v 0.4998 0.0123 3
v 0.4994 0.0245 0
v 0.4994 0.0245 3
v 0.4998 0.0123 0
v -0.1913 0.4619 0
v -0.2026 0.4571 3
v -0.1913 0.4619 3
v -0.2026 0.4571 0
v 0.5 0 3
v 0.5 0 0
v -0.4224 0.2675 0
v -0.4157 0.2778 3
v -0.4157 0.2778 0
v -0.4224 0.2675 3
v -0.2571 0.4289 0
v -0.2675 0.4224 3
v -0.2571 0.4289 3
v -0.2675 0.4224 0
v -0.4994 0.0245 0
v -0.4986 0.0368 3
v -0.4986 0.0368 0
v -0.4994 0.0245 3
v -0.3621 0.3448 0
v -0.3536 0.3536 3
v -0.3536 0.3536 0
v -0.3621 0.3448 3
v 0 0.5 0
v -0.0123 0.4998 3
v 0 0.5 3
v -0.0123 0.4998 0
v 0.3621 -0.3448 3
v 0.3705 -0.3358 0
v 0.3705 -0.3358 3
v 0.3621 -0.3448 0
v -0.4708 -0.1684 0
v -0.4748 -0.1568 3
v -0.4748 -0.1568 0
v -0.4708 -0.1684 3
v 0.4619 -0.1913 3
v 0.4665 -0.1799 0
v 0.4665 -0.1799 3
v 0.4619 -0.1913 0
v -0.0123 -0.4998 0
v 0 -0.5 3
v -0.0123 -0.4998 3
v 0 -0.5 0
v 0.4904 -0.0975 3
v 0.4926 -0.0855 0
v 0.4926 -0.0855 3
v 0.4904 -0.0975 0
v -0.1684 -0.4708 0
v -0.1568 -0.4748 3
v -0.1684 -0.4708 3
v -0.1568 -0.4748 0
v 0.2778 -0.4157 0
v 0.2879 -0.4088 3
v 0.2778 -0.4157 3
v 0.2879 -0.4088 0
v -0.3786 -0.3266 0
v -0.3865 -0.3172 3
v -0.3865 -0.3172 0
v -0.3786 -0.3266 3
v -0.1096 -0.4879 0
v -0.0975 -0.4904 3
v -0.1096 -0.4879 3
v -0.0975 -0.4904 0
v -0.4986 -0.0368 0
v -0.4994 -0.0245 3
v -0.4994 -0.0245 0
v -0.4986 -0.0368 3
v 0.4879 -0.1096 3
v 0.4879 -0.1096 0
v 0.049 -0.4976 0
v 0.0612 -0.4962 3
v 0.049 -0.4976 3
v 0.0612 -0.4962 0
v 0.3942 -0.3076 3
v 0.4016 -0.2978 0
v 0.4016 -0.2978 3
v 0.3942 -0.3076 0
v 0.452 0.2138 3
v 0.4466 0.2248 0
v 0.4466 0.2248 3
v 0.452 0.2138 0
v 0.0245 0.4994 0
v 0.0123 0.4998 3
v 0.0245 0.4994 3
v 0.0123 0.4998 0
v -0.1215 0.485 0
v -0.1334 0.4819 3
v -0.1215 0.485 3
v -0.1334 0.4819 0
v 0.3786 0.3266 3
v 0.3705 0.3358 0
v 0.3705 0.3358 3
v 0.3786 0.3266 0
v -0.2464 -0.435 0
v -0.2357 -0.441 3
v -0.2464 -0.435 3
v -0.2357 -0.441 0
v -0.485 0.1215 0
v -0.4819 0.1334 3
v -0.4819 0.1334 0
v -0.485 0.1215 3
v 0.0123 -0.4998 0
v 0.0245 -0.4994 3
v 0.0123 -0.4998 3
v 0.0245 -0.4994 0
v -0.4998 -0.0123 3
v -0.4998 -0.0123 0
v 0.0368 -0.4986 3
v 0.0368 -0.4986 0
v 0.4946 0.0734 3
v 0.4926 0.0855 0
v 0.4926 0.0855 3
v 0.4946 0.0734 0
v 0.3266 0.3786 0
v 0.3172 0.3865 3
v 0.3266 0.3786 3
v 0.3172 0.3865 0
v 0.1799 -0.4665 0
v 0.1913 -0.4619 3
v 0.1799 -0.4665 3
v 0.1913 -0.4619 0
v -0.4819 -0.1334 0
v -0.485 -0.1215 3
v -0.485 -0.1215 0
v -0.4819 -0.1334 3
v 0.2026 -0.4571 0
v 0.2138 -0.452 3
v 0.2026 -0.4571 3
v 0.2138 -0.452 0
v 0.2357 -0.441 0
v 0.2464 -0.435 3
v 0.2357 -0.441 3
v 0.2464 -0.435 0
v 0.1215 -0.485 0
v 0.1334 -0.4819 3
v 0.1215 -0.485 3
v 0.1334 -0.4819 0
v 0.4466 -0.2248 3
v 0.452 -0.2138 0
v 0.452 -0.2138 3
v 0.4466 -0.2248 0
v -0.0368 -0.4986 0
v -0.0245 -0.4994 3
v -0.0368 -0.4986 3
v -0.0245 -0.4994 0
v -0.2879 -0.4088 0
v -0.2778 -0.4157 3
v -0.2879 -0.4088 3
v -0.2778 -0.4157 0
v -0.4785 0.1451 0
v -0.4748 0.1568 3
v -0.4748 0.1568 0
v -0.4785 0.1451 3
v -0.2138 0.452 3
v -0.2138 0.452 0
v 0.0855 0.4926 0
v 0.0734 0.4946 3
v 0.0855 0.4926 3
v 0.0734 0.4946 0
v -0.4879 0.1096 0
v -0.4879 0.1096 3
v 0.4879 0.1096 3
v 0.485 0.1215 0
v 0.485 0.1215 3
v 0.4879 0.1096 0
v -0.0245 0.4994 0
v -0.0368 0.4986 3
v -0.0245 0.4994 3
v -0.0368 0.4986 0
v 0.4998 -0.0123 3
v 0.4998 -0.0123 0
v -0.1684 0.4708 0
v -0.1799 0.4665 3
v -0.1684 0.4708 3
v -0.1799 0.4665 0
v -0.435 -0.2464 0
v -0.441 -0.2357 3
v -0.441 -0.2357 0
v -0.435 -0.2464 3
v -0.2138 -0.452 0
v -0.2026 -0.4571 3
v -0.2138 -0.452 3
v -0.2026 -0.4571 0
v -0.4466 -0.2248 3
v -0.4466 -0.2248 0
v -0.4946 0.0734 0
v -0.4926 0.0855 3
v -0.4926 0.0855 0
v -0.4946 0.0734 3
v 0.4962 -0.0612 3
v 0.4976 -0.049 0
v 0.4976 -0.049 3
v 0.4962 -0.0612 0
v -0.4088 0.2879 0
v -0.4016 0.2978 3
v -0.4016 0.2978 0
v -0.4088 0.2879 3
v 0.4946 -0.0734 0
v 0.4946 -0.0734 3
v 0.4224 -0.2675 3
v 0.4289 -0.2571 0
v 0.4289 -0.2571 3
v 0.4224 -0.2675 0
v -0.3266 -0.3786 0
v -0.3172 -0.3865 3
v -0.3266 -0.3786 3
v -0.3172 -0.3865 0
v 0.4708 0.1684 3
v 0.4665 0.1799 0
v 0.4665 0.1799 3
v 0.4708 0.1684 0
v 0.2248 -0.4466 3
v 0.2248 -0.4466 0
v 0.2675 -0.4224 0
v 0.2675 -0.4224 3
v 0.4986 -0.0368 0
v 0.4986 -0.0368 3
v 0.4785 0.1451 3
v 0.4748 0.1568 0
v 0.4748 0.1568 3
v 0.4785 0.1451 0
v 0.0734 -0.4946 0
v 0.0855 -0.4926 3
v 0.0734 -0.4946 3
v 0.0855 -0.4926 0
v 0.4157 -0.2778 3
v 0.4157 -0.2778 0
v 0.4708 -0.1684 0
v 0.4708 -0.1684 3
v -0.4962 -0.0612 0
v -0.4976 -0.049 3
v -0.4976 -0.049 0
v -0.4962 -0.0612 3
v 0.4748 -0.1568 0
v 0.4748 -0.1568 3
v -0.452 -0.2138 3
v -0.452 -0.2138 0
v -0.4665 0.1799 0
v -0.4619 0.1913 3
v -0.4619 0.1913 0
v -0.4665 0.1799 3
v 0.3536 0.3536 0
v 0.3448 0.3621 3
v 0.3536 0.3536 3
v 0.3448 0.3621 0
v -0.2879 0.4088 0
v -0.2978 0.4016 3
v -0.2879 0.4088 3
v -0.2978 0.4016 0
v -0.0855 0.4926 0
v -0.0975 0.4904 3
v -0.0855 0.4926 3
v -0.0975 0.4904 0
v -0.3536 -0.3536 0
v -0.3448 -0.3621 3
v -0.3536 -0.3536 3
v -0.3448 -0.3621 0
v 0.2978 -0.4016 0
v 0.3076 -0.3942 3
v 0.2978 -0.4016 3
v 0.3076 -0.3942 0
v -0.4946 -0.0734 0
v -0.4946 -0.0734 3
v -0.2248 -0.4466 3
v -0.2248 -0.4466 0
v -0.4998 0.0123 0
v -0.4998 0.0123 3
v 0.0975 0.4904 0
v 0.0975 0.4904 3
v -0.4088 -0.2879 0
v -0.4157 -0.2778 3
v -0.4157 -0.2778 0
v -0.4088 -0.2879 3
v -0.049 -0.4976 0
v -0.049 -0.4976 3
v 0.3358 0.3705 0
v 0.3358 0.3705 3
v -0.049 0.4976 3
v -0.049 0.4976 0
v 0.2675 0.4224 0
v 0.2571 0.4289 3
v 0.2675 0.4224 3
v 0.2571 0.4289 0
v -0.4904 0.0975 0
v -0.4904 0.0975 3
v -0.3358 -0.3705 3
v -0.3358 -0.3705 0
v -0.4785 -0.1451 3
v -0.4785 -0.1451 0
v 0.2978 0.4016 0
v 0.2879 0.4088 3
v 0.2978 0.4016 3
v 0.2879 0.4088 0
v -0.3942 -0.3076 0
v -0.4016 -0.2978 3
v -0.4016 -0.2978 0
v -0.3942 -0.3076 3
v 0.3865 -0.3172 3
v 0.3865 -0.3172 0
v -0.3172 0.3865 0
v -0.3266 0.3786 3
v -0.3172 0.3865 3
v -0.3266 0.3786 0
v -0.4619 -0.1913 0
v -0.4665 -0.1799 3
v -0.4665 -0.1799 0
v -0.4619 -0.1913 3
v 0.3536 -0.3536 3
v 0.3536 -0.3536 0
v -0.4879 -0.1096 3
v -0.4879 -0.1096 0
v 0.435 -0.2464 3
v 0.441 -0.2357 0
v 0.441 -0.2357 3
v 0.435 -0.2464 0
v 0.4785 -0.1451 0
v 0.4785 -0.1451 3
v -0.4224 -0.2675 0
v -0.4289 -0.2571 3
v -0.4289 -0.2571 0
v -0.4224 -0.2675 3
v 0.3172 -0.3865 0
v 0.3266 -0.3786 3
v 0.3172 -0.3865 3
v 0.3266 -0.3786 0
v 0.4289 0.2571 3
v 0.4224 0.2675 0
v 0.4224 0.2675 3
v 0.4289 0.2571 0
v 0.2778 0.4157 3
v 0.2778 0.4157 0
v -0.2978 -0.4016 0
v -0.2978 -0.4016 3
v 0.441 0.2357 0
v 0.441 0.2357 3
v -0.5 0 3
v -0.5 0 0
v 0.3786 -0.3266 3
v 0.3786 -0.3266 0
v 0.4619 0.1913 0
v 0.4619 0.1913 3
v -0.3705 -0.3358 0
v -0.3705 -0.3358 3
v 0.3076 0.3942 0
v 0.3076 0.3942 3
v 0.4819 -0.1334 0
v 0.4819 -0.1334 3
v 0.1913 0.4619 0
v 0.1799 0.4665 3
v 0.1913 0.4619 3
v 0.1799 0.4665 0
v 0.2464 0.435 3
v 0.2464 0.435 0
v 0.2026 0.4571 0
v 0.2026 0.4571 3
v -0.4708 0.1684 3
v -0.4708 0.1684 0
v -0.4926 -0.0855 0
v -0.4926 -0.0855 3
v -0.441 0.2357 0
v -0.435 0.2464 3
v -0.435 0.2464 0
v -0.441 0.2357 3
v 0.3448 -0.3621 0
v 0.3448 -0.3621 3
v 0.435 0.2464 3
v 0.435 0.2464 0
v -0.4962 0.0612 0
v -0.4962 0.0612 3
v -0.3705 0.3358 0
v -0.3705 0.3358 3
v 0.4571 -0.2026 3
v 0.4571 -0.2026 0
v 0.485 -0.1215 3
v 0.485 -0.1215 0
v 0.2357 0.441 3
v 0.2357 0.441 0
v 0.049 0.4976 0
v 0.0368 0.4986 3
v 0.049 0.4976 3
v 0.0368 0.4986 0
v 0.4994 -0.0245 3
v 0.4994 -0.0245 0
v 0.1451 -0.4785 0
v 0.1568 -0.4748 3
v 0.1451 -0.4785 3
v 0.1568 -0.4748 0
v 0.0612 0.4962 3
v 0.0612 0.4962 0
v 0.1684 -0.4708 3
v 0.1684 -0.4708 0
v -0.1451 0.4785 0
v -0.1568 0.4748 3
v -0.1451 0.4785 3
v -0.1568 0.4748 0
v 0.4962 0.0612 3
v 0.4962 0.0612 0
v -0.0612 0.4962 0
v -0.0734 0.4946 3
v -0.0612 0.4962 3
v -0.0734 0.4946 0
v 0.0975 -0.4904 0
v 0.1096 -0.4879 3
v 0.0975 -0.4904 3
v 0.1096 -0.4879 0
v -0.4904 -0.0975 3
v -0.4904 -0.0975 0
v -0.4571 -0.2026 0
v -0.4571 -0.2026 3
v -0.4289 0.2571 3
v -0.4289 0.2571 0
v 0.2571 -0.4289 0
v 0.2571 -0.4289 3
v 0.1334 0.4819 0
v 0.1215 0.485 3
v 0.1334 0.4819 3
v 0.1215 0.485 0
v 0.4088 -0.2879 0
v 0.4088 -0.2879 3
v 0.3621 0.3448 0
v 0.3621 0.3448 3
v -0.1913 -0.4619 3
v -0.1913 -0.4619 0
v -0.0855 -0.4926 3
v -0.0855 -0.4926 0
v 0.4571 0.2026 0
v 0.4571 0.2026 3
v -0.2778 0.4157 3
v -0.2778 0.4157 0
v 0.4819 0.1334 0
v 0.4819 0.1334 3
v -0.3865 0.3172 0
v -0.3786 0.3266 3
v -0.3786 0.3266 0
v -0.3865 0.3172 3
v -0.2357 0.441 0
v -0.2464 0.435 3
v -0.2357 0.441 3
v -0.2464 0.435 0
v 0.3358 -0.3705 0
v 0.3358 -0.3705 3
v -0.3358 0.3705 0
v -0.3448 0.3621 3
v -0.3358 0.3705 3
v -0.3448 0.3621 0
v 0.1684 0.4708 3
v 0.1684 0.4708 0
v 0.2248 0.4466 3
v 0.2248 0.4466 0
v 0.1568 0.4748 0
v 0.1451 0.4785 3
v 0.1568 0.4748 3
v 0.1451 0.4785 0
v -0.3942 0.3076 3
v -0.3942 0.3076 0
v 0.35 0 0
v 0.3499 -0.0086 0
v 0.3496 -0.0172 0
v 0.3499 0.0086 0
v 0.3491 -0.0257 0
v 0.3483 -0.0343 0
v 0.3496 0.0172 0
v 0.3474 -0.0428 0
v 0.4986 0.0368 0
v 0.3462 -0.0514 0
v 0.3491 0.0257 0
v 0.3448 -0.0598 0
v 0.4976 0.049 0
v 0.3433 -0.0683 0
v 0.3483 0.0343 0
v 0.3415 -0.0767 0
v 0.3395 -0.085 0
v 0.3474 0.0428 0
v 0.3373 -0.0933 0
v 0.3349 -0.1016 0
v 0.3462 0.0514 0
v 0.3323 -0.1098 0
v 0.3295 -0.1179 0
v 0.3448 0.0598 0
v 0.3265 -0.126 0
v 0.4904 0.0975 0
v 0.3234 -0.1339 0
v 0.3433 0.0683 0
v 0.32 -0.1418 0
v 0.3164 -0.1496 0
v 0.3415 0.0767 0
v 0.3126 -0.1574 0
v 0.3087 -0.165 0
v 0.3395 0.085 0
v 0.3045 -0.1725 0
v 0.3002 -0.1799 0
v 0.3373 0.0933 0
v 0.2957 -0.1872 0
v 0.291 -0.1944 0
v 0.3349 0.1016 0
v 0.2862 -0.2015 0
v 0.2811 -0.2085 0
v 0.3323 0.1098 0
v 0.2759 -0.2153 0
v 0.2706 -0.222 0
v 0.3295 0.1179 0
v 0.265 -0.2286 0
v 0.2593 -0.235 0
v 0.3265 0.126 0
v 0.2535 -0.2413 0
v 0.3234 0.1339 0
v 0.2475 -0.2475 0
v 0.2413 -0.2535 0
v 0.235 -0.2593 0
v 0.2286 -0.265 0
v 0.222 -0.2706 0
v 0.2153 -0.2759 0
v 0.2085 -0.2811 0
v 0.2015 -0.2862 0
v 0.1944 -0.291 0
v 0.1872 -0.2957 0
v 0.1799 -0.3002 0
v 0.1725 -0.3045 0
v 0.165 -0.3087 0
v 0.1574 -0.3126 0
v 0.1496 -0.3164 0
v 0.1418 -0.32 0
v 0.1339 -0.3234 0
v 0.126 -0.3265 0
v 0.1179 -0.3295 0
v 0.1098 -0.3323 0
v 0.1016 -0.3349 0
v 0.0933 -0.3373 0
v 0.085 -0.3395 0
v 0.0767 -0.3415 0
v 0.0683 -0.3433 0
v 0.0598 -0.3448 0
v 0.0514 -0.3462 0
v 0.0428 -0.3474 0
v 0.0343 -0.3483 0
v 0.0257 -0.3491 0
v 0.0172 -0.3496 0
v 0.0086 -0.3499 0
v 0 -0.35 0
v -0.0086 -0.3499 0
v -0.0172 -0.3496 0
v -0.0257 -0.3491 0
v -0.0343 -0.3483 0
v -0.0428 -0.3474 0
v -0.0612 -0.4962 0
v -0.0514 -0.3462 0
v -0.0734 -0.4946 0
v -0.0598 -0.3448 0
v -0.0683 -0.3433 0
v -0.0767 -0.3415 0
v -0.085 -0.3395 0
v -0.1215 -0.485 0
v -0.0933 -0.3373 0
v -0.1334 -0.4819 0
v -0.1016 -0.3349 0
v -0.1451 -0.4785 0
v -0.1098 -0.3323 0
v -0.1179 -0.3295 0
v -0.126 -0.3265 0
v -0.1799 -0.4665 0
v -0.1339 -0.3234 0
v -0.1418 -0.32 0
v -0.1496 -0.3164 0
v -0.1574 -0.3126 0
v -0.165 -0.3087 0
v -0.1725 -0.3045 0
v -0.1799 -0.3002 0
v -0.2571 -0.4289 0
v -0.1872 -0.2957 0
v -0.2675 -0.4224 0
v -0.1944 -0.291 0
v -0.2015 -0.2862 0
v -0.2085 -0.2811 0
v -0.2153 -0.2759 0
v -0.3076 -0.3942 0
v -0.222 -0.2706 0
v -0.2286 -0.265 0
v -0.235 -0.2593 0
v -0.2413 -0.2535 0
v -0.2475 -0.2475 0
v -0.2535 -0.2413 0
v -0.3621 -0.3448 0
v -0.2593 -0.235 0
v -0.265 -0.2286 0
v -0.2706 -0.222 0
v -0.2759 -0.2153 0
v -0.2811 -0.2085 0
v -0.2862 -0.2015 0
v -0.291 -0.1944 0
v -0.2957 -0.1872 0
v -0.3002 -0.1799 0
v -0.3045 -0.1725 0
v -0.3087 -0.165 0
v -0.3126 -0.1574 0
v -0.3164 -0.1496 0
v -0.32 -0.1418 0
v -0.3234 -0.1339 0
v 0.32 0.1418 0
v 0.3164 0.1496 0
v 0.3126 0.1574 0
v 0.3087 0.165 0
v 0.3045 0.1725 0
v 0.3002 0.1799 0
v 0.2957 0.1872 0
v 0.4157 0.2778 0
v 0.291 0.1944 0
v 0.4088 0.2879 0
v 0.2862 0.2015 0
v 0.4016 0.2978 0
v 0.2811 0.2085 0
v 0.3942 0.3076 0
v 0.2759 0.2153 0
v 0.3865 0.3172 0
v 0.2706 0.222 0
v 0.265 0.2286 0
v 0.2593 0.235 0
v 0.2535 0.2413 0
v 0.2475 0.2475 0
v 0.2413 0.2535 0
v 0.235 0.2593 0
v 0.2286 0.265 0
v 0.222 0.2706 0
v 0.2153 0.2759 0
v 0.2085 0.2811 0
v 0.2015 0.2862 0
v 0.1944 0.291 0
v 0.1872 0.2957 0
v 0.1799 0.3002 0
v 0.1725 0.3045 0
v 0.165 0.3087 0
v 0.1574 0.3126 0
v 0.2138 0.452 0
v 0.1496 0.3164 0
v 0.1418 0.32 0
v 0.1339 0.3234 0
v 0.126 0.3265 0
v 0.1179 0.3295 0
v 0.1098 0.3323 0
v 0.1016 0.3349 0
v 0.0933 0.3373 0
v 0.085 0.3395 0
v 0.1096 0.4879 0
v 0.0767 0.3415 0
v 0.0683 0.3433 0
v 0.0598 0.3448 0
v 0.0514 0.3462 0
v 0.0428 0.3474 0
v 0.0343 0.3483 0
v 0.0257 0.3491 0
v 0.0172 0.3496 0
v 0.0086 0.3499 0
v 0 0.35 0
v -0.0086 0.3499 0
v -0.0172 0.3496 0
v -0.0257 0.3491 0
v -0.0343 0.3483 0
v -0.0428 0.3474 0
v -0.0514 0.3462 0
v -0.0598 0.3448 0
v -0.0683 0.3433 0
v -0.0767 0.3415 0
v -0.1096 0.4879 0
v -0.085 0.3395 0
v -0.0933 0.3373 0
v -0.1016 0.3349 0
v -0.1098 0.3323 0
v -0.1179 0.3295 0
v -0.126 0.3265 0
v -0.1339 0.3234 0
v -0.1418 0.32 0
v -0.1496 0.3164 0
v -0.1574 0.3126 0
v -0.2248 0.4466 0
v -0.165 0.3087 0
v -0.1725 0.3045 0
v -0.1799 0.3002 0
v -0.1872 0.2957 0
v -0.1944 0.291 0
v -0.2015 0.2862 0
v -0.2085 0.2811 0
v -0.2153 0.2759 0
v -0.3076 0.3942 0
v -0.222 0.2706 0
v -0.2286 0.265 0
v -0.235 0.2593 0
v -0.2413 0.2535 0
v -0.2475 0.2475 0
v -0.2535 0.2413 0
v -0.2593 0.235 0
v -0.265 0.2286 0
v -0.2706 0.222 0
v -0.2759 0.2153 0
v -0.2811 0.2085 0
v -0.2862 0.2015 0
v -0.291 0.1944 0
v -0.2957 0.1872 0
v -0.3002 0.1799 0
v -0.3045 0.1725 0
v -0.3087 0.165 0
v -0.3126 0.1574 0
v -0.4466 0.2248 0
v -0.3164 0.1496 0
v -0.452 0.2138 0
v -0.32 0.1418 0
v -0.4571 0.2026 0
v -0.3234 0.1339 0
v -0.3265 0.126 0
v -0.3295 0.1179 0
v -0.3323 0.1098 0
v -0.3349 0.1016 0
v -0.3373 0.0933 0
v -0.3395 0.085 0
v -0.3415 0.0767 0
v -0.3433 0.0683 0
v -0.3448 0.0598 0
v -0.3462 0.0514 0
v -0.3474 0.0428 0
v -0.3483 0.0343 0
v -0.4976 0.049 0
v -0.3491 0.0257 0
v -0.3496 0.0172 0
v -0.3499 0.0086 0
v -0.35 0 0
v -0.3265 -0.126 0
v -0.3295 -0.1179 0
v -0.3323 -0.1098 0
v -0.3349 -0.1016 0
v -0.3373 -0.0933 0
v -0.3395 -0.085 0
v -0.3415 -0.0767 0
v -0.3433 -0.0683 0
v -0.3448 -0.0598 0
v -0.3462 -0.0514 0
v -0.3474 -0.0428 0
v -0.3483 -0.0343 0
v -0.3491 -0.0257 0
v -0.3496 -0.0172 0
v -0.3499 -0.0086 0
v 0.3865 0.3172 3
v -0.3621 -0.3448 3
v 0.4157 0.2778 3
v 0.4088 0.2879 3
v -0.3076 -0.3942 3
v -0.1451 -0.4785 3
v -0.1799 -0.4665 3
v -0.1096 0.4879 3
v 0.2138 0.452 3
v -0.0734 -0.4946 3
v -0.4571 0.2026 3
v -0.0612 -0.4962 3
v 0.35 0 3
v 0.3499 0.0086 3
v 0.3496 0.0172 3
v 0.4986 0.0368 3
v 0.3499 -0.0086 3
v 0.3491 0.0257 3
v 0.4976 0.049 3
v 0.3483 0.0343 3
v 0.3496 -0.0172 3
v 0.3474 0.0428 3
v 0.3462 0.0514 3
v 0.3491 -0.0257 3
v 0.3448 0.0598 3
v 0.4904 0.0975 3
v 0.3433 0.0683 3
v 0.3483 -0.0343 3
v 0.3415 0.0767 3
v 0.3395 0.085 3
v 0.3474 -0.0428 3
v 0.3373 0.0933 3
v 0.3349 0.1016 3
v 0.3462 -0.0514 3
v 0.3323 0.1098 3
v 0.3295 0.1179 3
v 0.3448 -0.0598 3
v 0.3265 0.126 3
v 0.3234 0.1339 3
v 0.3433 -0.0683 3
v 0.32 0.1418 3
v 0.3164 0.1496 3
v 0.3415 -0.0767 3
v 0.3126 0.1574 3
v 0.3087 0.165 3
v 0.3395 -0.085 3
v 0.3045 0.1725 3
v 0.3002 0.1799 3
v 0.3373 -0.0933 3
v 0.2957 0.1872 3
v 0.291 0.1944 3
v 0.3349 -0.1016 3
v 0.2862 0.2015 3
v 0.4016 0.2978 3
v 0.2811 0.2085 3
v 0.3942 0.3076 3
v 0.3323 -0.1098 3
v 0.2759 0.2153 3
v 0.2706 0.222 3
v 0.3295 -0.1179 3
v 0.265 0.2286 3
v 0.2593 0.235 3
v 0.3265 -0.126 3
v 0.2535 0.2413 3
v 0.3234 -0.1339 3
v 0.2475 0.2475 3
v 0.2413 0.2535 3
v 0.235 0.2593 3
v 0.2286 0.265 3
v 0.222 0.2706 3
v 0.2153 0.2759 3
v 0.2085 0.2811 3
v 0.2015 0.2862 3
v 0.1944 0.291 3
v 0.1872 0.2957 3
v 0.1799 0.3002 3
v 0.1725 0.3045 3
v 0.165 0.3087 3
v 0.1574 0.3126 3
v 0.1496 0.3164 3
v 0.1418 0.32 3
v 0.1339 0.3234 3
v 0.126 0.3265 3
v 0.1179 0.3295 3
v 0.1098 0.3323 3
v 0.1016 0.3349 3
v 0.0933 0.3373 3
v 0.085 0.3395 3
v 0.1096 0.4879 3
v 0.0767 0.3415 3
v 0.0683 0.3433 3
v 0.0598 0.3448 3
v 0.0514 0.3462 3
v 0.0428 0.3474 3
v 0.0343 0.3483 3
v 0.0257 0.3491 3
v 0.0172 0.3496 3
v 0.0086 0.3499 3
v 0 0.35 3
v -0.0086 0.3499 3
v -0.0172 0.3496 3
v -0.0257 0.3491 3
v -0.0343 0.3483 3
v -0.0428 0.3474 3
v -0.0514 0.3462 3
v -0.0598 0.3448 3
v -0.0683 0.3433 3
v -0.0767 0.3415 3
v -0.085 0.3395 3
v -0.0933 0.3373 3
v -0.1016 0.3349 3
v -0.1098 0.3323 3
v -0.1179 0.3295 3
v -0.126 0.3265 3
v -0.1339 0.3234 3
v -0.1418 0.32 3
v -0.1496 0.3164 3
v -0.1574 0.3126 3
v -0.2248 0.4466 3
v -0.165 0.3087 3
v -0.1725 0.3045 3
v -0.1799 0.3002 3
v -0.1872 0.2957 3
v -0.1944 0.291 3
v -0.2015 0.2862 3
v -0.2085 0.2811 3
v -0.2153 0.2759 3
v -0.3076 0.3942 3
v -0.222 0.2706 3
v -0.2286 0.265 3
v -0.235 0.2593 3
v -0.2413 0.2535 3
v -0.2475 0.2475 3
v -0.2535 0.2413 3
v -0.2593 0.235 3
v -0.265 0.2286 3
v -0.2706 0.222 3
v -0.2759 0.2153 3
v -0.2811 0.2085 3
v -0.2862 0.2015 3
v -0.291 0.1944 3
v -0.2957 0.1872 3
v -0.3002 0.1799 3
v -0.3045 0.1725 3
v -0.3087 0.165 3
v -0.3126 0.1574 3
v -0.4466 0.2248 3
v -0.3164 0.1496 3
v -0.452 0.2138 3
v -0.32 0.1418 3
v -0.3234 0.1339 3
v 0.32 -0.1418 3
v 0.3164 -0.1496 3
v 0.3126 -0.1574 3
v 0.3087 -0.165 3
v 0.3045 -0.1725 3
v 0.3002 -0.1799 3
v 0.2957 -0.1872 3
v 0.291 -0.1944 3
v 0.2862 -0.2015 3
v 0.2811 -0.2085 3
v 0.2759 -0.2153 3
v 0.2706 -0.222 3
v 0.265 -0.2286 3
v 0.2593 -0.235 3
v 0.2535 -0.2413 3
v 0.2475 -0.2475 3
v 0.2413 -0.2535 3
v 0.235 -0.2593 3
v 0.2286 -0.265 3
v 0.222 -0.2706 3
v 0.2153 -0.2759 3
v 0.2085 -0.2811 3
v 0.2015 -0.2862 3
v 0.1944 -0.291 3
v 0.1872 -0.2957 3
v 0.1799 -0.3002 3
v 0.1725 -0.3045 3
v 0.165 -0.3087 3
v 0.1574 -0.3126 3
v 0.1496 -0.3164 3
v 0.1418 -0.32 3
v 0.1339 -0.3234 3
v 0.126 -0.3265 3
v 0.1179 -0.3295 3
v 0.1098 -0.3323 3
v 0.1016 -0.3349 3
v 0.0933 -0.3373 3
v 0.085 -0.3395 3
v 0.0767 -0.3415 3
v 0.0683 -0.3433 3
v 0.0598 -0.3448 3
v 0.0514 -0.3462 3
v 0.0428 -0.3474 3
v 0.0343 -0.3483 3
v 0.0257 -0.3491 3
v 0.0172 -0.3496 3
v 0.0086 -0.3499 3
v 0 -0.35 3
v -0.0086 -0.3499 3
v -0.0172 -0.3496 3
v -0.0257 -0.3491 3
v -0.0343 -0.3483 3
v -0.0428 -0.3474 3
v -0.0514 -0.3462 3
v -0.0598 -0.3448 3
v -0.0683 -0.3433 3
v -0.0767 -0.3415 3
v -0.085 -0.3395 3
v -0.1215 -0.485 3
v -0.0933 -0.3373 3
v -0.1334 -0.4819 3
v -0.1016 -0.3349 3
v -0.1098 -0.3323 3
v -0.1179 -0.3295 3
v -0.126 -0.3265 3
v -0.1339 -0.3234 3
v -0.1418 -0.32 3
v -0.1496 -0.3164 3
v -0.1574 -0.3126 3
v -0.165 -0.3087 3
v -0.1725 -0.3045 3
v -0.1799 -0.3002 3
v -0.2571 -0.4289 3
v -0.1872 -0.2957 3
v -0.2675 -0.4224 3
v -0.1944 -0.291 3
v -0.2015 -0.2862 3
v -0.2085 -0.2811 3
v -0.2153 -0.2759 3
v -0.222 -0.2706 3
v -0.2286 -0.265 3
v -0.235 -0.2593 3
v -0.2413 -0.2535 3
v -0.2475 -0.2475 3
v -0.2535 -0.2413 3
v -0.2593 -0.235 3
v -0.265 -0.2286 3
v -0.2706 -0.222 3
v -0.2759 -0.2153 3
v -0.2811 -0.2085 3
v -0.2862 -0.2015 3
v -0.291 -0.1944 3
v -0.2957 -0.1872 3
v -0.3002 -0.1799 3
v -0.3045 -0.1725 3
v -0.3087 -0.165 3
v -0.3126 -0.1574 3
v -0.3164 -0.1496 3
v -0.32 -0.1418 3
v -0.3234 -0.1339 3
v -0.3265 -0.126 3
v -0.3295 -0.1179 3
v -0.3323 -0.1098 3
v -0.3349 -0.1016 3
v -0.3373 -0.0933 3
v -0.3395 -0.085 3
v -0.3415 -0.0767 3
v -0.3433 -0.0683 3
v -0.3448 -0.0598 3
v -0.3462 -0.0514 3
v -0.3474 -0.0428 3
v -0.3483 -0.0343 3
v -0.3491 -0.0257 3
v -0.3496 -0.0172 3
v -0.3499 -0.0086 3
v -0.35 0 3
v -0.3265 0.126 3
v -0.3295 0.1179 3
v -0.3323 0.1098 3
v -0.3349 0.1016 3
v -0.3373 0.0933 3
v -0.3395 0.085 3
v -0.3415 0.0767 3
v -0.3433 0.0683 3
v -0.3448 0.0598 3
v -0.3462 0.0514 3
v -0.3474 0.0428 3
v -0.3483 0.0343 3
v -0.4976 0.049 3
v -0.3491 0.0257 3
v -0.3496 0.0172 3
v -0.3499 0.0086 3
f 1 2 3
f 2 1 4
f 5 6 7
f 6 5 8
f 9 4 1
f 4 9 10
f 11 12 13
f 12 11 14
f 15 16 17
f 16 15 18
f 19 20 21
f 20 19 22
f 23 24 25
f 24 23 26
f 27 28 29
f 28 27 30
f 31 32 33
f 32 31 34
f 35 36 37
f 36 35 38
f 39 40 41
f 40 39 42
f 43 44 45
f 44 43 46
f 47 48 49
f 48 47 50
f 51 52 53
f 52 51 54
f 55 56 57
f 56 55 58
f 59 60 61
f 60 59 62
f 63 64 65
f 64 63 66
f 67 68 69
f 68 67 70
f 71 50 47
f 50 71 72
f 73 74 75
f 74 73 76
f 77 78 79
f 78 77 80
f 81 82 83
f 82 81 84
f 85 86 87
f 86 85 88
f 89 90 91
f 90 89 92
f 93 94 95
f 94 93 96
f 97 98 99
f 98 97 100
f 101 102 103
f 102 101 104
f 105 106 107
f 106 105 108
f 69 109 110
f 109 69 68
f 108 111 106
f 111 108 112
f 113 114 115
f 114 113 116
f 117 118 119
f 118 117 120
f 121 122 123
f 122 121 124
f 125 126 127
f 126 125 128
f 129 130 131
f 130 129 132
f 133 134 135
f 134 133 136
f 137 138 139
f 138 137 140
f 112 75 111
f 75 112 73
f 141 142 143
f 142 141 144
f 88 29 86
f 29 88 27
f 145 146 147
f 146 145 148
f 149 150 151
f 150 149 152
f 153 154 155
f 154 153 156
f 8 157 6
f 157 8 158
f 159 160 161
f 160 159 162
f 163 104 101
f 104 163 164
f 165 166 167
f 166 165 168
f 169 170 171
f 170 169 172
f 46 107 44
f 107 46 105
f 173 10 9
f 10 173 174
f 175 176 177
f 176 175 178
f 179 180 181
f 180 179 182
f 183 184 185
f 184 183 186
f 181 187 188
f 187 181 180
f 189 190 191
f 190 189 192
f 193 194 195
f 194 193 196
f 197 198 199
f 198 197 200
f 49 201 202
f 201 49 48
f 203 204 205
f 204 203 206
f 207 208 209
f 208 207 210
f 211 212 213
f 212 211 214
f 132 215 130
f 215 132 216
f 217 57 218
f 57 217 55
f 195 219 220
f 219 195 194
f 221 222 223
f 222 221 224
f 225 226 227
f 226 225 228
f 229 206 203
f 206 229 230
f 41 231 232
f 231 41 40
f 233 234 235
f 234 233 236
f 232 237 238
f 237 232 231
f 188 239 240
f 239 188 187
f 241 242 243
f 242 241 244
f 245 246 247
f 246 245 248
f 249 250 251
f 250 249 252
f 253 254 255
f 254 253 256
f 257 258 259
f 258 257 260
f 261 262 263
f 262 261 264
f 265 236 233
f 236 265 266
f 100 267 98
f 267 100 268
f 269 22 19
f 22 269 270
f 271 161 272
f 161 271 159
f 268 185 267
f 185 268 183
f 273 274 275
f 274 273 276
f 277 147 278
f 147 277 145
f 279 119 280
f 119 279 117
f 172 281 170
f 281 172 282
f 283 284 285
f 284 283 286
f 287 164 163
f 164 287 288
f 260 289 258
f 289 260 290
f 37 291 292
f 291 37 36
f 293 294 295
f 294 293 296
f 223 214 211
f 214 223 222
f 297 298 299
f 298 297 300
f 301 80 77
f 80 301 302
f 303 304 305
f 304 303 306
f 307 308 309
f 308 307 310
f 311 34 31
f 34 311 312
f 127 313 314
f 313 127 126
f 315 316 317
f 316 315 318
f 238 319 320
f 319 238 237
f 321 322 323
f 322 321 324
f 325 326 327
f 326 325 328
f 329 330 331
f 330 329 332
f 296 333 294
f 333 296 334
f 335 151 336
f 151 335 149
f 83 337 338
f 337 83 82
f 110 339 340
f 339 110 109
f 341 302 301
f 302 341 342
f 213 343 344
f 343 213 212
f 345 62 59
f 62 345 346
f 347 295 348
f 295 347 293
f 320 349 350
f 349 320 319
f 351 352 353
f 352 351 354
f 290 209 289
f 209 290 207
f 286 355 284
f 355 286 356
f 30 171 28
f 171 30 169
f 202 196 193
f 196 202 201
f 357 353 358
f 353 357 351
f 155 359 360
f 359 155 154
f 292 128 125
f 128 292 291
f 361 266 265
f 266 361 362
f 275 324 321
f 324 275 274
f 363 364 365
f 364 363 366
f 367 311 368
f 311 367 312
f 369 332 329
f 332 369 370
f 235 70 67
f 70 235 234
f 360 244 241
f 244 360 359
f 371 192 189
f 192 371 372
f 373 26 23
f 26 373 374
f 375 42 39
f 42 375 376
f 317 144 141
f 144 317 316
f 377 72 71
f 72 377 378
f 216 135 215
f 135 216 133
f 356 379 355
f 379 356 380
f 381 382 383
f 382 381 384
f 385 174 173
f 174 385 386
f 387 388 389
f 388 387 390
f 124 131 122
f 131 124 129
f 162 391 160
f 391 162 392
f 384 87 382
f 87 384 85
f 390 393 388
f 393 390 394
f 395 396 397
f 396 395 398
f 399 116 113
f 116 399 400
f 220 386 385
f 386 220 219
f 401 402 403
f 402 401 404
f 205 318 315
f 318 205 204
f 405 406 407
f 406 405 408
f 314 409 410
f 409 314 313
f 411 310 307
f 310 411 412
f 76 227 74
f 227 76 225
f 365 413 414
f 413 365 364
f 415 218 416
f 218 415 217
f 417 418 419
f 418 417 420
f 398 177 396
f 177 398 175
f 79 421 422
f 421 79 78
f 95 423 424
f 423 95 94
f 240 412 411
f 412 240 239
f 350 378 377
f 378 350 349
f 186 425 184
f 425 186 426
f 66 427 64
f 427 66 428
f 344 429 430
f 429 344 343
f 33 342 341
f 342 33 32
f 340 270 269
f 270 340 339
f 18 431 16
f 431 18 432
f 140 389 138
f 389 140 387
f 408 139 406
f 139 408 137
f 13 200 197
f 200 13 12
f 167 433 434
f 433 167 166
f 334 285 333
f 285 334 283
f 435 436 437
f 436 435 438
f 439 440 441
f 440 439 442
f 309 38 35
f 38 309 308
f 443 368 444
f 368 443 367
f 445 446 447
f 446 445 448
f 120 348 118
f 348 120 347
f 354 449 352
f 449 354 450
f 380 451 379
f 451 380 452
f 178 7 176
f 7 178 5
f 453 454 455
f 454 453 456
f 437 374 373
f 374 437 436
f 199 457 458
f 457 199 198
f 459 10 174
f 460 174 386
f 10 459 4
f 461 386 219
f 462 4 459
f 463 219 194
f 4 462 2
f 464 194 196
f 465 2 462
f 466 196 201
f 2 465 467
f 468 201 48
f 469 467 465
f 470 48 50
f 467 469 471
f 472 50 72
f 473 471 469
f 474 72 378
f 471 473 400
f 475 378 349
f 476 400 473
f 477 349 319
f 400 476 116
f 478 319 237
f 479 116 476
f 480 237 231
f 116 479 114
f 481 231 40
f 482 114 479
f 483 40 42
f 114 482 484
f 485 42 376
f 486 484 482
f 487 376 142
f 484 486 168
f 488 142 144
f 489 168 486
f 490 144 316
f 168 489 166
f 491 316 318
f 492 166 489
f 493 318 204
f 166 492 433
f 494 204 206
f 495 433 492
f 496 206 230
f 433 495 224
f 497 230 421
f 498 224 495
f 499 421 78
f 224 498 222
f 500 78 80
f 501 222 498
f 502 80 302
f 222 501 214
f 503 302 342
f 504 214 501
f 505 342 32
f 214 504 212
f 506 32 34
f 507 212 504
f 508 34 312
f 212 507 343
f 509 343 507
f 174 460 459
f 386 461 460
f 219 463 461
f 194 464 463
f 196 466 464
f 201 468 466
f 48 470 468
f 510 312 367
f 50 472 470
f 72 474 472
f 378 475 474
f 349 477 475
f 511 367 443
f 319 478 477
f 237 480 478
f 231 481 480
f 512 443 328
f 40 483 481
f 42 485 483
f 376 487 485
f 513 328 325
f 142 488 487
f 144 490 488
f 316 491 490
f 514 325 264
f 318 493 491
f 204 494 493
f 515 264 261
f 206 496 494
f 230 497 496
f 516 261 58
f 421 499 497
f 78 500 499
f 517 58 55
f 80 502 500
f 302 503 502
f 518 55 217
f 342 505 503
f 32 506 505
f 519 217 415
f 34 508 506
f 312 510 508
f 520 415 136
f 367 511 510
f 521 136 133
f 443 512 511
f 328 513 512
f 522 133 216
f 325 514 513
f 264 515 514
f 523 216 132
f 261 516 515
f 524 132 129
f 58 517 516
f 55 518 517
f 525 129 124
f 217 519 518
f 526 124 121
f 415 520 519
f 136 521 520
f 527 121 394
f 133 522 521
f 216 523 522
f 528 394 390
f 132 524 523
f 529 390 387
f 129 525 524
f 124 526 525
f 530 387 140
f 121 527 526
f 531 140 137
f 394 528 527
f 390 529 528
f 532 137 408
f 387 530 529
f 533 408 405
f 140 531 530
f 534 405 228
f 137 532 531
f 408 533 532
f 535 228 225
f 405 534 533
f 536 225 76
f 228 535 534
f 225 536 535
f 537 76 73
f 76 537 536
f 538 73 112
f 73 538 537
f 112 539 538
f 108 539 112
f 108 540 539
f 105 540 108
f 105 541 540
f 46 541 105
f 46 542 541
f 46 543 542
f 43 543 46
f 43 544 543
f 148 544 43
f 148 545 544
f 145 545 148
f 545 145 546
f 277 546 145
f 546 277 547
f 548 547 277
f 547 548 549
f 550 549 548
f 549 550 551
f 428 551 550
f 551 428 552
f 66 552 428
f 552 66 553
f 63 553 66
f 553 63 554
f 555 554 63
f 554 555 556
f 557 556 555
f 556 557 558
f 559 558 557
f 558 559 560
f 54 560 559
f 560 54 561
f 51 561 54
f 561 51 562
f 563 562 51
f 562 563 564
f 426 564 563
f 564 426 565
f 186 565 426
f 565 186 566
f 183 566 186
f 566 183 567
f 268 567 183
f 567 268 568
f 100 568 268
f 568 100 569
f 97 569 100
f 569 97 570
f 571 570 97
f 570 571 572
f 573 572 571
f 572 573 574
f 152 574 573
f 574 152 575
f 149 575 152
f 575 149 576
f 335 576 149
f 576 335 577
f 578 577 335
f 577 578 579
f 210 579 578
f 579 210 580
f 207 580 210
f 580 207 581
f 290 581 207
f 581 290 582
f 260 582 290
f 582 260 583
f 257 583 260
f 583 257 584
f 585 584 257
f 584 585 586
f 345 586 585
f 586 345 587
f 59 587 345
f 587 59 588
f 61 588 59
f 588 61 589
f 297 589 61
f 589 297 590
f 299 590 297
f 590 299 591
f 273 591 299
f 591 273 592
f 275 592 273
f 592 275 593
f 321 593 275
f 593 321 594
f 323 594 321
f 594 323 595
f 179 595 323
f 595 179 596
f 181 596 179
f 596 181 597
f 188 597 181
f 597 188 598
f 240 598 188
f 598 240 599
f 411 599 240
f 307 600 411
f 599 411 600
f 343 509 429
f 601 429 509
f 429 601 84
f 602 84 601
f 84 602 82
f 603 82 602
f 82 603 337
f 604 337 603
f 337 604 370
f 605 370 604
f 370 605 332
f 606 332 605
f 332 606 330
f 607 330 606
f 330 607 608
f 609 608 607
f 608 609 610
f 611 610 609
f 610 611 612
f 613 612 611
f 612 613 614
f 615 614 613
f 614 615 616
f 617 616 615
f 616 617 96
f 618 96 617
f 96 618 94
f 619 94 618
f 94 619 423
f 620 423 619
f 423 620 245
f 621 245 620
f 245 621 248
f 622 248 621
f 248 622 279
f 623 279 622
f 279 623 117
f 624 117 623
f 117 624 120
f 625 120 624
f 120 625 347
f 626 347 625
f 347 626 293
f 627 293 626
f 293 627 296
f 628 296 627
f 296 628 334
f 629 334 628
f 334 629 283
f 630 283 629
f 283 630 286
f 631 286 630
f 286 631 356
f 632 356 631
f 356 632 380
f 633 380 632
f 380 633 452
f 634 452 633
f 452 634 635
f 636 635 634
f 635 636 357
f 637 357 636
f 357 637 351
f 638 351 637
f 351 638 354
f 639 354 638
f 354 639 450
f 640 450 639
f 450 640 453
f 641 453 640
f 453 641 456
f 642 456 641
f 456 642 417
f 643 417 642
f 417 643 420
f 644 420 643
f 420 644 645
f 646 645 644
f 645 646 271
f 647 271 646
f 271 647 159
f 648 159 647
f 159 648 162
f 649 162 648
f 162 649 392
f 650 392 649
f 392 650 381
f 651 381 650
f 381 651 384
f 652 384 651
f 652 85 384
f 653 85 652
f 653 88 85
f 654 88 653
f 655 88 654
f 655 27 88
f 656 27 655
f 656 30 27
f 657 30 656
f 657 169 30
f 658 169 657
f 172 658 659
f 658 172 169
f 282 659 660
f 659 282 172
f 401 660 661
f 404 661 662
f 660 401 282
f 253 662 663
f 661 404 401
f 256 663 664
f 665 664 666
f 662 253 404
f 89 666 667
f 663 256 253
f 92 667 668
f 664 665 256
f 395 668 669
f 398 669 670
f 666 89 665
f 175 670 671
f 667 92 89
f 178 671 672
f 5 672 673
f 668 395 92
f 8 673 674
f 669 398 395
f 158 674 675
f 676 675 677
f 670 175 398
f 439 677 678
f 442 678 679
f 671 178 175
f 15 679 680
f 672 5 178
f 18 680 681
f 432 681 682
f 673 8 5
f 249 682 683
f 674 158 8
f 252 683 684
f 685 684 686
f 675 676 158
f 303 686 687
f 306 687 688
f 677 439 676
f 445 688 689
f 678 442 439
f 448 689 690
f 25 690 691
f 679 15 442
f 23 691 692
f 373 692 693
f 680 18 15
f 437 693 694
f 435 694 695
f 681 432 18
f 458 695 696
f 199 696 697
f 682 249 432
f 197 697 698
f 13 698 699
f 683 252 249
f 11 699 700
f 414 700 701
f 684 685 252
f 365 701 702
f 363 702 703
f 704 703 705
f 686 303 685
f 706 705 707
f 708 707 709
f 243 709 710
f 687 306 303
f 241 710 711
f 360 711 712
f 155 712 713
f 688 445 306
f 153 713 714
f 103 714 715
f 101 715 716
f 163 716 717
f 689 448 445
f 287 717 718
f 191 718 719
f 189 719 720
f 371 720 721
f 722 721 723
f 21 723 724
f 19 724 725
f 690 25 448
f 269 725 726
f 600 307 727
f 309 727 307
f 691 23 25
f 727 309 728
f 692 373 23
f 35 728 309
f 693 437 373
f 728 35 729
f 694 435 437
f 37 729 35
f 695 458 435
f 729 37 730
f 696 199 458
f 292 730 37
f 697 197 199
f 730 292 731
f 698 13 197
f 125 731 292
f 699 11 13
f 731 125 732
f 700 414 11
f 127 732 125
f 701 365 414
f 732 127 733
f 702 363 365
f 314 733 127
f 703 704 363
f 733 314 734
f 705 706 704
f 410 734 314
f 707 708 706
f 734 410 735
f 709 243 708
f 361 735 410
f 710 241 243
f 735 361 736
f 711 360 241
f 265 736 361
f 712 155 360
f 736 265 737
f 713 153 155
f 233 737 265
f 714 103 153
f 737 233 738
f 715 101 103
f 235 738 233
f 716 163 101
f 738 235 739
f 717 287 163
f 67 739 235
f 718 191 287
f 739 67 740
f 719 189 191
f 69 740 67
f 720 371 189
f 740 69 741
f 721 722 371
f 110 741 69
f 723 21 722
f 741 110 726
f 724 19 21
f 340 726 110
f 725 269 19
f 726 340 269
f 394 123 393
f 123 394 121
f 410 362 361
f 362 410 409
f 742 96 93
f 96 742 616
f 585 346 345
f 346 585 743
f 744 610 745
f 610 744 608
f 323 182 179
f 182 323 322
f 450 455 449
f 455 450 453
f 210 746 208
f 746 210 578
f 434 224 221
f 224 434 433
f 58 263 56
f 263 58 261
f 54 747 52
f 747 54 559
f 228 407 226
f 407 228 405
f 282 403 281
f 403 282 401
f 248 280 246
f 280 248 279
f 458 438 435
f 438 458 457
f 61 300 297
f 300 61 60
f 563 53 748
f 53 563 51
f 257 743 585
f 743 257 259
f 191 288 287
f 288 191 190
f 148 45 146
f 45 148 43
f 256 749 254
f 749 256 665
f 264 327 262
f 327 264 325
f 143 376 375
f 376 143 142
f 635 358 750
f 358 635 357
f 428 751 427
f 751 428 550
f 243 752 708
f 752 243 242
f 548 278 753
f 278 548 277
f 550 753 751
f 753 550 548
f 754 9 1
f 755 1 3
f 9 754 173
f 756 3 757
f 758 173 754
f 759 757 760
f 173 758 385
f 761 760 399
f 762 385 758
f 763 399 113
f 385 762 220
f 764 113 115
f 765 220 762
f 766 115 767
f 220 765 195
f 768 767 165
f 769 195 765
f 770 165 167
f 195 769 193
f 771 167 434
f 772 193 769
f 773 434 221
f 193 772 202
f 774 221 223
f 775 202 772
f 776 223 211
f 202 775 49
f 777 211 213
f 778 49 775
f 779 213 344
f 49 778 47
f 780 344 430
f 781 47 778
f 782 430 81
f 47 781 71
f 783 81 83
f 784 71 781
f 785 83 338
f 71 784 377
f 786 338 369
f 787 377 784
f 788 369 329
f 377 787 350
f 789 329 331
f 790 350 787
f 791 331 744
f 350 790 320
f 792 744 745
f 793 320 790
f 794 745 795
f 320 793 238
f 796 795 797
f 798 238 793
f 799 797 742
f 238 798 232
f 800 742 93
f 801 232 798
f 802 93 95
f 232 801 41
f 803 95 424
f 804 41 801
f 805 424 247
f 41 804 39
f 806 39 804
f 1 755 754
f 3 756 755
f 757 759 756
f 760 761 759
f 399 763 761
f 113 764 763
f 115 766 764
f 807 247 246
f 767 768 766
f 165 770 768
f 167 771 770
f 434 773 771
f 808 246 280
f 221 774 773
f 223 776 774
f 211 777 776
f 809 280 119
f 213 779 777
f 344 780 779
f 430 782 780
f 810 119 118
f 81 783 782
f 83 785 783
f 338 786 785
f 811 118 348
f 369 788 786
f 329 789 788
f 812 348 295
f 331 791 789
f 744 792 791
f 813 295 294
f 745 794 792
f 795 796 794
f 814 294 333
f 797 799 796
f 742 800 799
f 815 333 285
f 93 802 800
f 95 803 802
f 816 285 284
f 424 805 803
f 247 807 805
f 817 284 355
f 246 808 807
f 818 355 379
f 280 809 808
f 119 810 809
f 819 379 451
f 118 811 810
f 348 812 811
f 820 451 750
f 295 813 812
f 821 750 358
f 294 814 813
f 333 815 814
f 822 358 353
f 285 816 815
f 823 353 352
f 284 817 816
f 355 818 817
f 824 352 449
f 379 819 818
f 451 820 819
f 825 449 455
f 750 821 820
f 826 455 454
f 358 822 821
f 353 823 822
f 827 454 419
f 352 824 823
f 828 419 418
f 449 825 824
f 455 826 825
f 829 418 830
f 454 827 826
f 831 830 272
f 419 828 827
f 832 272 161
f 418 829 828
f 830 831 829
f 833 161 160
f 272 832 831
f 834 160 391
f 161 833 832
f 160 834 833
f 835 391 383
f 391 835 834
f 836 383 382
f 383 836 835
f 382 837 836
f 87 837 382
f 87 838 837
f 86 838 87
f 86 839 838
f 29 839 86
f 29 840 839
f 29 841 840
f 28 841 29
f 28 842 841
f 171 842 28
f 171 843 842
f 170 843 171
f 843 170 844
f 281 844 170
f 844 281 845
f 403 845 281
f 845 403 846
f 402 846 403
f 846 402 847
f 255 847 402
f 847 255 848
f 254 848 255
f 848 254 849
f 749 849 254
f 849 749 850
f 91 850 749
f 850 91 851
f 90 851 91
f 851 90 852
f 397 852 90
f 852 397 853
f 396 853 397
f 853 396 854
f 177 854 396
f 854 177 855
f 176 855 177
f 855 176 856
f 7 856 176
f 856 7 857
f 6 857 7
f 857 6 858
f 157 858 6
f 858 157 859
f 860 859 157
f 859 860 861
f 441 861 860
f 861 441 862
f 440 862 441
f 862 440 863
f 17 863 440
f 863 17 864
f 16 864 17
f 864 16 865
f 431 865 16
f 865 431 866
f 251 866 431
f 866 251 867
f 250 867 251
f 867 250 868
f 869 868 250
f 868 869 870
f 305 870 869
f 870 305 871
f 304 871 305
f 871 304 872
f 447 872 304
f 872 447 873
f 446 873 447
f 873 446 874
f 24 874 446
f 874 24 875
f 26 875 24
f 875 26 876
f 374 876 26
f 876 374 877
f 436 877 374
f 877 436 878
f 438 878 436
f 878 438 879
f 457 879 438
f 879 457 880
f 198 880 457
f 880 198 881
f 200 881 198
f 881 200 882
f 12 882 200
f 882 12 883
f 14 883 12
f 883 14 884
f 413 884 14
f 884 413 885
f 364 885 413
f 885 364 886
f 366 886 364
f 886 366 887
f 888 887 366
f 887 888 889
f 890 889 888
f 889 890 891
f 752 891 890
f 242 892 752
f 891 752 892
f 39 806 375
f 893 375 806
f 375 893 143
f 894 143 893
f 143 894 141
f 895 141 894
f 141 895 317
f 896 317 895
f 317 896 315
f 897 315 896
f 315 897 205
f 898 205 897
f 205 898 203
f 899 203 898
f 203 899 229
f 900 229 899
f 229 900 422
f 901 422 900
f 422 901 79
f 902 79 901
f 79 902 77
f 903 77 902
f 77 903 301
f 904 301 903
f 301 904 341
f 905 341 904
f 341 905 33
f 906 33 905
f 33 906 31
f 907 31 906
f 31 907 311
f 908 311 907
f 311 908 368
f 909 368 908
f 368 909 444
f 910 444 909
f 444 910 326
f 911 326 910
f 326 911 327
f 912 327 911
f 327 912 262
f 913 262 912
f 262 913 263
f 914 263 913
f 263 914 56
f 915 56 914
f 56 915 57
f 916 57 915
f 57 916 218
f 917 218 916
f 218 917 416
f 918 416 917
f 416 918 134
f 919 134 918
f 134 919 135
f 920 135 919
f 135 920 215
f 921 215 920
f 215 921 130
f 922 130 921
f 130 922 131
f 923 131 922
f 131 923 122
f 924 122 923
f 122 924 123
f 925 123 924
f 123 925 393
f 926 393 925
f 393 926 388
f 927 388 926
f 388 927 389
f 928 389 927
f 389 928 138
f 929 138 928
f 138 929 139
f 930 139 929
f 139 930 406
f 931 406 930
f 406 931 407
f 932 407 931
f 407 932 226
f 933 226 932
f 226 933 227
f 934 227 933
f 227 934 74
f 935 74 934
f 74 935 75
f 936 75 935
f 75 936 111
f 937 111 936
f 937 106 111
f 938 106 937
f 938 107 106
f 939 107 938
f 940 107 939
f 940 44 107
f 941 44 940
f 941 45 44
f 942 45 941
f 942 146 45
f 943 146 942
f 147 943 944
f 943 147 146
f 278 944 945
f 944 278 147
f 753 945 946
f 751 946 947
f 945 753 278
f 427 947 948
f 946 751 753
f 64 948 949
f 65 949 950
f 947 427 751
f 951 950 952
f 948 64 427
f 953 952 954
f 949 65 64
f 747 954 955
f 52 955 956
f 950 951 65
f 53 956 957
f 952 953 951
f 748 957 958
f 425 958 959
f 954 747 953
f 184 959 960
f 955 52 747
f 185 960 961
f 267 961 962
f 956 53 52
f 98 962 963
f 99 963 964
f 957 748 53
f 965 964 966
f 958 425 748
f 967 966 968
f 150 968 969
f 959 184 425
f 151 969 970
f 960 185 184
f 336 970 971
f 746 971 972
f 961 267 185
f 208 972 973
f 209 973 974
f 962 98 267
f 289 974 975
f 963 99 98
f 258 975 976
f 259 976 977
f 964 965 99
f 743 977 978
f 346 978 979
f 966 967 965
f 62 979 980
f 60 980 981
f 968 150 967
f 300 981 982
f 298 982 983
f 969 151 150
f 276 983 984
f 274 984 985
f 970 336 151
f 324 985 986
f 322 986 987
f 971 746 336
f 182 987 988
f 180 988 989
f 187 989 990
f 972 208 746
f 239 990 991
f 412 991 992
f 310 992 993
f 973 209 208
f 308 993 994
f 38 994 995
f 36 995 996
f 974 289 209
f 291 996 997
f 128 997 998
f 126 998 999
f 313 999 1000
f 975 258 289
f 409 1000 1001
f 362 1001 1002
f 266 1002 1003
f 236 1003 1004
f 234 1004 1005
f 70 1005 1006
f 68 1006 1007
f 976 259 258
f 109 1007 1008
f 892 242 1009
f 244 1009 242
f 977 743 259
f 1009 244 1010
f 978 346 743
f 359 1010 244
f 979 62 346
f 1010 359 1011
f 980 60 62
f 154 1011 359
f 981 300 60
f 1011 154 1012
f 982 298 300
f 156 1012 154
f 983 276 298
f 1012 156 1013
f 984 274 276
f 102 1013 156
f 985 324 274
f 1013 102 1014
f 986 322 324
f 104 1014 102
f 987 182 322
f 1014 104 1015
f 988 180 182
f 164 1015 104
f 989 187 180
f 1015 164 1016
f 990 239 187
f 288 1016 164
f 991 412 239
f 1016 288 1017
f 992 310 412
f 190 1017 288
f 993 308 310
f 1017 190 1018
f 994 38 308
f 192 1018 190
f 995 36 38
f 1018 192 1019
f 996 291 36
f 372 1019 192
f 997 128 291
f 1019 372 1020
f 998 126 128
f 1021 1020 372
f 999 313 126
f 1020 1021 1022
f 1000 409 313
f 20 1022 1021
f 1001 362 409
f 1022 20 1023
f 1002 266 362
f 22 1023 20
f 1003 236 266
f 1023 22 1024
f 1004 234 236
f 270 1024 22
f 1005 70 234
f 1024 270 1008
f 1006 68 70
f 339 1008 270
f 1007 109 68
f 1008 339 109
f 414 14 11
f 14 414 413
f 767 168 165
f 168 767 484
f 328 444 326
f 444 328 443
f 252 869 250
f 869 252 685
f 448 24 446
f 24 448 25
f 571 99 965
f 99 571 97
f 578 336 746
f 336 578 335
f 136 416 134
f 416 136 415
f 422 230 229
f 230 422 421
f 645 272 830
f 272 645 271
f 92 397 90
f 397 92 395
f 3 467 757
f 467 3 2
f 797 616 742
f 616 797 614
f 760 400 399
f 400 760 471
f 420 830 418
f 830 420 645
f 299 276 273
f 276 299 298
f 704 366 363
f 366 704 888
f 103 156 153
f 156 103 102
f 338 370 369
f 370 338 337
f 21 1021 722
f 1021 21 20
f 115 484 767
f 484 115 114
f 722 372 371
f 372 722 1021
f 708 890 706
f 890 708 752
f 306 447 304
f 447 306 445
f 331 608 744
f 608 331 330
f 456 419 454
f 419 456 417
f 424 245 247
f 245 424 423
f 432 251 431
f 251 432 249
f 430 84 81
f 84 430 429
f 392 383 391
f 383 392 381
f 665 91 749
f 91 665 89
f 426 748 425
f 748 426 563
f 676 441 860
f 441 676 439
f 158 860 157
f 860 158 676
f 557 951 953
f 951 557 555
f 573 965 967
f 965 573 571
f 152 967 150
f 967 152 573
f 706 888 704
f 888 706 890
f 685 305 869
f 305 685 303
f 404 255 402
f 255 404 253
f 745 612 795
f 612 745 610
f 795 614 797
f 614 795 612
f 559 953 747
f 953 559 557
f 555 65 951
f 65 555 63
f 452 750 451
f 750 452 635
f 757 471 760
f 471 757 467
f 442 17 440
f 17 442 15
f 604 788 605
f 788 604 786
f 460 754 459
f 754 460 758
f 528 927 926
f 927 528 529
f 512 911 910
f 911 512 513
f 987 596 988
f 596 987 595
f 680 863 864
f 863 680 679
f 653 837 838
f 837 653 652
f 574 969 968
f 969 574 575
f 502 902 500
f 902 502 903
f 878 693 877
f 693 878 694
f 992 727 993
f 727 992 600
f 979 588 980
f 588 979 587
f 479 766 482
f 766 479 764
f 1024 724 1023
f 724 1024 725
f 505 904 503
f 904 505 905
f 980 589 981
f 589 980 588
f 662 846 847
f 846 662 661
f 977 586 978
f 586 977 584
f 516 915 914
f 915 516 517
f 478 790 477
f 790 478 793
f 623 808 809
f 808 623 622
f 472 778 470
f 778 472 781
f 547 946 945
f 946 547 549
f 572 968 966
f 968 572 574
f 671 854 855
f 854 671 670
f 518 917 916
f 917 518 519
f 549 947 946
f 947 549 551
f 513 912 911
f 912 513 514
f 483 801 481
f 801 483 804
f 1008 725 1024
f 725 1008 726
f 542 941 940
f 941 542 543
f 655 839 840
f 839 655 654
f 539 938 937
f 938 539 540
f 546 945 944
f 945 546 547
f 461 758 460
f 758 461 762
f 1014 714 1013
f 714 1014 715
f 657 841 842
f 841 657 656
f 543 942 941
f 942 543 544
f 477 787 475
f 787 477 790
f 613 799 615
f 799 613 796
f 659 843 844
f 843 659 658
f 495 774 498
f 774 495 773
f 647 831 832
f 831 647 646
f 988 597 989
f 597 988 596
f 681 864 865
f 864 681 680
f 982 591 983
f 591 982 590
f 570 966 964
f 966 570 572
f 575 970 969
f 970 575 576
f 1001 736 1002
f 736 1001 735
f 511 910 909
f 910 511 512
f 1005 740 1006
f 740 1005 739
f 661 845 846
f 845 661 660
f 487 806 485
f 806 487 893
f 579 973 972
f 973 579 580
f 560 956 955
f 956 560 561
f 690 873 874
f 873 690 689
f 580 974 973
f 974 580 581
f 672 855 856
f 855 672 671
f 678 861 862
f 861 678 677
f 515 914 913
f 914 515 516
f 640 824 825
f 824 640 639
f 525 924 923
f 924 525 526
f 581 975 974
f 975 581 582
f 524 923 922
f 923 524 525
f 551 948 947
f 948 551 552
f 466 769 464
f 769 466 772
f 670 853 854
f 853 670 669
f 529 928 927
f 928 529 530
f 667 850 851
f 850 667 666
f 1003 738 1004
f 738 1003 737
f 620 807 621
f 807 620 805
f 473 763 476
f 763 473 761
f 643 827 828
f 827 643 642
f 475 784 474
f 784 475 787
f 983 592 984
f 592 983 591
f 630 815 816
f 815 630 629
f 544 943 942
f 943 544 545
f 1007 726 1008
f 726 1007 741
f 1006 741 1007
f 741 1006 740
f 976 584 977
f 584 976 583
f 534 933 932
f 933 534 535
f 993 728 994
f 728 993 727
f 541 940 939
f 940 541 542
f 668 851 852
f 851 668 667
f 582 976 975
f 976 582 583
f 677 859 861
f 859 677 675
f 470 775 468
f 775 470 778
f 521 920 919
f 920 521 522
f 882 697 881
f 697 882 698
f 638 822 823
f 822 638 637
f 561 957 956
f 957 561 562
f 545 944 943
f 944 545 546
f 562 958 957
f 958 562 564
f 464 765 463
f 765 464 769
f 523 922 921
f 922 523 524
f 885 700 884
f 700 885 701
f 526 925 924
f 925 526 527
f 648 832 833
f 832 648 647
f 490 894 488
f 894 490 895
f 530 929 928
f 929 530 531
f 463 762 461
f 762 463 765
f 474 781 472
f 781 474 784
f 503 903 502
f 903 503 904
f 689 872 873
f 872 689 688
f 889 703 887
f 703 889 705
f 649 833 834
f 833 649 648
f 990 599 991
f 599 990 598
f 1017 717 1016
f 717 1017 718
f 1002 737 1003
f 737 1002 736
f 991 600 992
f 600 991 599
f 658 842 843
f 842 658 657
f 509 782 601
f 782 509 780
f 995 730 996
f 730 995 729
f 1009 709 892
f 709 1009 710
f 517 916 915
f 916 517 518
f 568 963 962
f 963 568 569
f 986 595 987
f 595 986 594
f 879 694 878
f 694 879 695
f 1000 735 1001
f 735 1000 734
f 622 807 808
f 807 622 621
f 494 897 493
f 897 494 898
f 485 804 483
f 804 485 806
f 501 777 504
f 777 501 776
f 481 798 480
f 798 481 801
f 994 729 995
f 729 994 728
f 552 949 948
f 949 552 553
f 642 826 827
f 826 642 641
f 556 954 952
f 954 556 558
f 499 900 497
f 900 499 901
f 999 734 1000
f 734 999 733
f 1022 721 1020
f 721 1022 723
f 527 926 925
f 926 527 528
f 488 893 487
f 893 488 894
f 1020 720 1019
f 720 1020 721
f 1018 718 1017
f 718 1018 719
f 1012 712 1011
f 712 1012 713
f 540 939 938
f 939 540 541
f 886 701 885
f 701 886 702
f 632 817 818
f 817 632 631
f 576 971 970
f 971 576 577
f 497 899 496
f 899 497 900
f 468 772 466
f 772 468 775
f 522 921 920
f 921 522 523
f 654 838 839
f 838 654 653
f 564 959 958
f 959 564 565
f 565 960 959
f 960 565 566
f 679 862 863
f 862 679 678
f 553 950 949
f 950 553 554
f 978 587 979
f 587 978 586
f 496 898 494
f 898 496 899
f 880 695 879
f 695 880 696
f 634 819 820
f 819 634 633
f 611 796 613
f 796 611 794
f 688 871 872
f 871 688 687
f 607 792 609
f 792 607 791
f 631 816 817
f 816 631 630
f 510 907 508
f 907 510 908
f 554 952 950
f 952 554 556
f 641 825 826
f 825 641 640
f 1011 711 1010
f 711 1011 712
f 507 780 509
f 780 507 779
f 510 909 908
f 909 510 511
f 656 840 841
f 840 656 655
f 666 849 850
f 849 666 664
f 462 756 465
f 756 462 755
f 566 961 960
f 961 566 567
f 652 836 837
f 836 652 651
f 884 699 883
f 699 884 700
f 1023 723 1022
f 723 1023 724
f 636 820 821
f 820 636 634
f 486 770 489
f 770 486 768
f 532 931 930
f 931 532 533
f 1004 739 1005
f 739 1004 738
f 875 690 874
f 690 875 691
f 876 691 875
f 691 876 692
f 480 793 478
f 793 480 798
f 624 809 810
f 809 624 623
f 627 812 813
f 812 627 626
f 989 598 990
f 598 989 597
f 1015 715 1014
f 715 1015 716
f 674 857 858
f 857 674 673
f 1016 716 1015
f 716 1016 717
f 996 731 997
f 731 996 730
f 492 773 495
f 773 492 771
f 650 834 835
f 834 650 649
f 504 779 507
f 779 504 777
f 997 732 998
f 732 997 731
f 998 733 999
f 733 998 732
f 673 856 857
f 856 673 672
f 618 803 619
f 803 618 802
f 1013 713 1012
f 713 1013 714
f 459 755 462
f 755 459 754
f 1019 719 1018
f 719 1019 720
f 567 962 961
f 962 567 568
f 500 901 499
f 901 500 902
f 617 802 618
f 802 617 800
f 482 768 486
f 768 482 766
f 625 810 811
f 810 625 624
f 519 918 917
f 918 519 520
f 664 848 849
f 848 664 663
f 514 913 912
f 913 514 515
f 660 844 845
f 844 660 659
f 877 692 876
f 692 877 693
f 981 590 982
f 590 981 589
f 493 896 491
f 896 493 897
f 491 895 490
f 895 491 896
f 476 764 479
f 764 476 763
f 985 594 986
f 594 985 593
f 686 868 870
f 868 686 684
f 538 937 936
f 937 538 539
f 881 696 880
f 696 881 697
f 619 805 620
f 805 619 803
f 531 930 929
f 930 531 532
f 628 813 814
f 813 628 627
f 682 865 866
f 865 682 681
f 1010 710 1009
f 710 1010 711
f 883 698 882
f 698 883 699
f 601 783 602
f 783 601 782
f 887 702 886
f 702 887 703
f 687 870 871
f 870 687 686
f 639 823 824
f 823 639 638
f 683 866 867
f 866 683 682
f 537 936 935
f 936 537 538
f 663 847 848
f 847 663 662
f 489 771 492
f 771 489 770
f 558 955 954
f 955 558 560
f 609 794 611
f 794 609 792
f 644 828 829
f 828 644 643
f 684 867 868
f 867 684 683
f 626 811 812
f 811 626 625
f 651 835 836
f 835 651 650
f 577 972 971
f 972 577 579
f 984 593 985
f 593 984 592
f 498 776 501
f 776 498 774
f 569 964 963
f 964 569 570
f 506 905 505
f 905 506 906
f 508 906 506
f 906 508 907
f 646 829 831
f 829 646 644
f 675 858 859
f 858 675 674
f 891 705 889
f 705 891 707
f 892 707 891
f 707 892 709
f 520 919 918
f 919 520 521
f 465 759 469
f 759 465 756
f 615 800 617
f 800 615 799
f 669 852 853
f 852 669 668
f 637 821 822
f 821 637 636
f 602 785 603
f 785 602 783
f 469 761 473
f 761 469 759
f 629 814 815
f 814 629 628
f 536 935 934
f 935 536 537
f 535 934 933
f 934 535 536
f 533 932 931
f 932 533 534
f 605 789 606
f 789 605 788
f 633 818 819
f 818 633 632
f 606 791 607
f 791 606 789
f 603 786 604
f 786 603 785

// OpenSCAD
// Tube for Stacks of Shapes
// by Slashee the Cow
$fn = 256;

color("DarkKhaki")
difference(){
    linear_extrude(3)
        circle(d=1);
    linear_extrude(4)
        circle(d=0.7);
}
